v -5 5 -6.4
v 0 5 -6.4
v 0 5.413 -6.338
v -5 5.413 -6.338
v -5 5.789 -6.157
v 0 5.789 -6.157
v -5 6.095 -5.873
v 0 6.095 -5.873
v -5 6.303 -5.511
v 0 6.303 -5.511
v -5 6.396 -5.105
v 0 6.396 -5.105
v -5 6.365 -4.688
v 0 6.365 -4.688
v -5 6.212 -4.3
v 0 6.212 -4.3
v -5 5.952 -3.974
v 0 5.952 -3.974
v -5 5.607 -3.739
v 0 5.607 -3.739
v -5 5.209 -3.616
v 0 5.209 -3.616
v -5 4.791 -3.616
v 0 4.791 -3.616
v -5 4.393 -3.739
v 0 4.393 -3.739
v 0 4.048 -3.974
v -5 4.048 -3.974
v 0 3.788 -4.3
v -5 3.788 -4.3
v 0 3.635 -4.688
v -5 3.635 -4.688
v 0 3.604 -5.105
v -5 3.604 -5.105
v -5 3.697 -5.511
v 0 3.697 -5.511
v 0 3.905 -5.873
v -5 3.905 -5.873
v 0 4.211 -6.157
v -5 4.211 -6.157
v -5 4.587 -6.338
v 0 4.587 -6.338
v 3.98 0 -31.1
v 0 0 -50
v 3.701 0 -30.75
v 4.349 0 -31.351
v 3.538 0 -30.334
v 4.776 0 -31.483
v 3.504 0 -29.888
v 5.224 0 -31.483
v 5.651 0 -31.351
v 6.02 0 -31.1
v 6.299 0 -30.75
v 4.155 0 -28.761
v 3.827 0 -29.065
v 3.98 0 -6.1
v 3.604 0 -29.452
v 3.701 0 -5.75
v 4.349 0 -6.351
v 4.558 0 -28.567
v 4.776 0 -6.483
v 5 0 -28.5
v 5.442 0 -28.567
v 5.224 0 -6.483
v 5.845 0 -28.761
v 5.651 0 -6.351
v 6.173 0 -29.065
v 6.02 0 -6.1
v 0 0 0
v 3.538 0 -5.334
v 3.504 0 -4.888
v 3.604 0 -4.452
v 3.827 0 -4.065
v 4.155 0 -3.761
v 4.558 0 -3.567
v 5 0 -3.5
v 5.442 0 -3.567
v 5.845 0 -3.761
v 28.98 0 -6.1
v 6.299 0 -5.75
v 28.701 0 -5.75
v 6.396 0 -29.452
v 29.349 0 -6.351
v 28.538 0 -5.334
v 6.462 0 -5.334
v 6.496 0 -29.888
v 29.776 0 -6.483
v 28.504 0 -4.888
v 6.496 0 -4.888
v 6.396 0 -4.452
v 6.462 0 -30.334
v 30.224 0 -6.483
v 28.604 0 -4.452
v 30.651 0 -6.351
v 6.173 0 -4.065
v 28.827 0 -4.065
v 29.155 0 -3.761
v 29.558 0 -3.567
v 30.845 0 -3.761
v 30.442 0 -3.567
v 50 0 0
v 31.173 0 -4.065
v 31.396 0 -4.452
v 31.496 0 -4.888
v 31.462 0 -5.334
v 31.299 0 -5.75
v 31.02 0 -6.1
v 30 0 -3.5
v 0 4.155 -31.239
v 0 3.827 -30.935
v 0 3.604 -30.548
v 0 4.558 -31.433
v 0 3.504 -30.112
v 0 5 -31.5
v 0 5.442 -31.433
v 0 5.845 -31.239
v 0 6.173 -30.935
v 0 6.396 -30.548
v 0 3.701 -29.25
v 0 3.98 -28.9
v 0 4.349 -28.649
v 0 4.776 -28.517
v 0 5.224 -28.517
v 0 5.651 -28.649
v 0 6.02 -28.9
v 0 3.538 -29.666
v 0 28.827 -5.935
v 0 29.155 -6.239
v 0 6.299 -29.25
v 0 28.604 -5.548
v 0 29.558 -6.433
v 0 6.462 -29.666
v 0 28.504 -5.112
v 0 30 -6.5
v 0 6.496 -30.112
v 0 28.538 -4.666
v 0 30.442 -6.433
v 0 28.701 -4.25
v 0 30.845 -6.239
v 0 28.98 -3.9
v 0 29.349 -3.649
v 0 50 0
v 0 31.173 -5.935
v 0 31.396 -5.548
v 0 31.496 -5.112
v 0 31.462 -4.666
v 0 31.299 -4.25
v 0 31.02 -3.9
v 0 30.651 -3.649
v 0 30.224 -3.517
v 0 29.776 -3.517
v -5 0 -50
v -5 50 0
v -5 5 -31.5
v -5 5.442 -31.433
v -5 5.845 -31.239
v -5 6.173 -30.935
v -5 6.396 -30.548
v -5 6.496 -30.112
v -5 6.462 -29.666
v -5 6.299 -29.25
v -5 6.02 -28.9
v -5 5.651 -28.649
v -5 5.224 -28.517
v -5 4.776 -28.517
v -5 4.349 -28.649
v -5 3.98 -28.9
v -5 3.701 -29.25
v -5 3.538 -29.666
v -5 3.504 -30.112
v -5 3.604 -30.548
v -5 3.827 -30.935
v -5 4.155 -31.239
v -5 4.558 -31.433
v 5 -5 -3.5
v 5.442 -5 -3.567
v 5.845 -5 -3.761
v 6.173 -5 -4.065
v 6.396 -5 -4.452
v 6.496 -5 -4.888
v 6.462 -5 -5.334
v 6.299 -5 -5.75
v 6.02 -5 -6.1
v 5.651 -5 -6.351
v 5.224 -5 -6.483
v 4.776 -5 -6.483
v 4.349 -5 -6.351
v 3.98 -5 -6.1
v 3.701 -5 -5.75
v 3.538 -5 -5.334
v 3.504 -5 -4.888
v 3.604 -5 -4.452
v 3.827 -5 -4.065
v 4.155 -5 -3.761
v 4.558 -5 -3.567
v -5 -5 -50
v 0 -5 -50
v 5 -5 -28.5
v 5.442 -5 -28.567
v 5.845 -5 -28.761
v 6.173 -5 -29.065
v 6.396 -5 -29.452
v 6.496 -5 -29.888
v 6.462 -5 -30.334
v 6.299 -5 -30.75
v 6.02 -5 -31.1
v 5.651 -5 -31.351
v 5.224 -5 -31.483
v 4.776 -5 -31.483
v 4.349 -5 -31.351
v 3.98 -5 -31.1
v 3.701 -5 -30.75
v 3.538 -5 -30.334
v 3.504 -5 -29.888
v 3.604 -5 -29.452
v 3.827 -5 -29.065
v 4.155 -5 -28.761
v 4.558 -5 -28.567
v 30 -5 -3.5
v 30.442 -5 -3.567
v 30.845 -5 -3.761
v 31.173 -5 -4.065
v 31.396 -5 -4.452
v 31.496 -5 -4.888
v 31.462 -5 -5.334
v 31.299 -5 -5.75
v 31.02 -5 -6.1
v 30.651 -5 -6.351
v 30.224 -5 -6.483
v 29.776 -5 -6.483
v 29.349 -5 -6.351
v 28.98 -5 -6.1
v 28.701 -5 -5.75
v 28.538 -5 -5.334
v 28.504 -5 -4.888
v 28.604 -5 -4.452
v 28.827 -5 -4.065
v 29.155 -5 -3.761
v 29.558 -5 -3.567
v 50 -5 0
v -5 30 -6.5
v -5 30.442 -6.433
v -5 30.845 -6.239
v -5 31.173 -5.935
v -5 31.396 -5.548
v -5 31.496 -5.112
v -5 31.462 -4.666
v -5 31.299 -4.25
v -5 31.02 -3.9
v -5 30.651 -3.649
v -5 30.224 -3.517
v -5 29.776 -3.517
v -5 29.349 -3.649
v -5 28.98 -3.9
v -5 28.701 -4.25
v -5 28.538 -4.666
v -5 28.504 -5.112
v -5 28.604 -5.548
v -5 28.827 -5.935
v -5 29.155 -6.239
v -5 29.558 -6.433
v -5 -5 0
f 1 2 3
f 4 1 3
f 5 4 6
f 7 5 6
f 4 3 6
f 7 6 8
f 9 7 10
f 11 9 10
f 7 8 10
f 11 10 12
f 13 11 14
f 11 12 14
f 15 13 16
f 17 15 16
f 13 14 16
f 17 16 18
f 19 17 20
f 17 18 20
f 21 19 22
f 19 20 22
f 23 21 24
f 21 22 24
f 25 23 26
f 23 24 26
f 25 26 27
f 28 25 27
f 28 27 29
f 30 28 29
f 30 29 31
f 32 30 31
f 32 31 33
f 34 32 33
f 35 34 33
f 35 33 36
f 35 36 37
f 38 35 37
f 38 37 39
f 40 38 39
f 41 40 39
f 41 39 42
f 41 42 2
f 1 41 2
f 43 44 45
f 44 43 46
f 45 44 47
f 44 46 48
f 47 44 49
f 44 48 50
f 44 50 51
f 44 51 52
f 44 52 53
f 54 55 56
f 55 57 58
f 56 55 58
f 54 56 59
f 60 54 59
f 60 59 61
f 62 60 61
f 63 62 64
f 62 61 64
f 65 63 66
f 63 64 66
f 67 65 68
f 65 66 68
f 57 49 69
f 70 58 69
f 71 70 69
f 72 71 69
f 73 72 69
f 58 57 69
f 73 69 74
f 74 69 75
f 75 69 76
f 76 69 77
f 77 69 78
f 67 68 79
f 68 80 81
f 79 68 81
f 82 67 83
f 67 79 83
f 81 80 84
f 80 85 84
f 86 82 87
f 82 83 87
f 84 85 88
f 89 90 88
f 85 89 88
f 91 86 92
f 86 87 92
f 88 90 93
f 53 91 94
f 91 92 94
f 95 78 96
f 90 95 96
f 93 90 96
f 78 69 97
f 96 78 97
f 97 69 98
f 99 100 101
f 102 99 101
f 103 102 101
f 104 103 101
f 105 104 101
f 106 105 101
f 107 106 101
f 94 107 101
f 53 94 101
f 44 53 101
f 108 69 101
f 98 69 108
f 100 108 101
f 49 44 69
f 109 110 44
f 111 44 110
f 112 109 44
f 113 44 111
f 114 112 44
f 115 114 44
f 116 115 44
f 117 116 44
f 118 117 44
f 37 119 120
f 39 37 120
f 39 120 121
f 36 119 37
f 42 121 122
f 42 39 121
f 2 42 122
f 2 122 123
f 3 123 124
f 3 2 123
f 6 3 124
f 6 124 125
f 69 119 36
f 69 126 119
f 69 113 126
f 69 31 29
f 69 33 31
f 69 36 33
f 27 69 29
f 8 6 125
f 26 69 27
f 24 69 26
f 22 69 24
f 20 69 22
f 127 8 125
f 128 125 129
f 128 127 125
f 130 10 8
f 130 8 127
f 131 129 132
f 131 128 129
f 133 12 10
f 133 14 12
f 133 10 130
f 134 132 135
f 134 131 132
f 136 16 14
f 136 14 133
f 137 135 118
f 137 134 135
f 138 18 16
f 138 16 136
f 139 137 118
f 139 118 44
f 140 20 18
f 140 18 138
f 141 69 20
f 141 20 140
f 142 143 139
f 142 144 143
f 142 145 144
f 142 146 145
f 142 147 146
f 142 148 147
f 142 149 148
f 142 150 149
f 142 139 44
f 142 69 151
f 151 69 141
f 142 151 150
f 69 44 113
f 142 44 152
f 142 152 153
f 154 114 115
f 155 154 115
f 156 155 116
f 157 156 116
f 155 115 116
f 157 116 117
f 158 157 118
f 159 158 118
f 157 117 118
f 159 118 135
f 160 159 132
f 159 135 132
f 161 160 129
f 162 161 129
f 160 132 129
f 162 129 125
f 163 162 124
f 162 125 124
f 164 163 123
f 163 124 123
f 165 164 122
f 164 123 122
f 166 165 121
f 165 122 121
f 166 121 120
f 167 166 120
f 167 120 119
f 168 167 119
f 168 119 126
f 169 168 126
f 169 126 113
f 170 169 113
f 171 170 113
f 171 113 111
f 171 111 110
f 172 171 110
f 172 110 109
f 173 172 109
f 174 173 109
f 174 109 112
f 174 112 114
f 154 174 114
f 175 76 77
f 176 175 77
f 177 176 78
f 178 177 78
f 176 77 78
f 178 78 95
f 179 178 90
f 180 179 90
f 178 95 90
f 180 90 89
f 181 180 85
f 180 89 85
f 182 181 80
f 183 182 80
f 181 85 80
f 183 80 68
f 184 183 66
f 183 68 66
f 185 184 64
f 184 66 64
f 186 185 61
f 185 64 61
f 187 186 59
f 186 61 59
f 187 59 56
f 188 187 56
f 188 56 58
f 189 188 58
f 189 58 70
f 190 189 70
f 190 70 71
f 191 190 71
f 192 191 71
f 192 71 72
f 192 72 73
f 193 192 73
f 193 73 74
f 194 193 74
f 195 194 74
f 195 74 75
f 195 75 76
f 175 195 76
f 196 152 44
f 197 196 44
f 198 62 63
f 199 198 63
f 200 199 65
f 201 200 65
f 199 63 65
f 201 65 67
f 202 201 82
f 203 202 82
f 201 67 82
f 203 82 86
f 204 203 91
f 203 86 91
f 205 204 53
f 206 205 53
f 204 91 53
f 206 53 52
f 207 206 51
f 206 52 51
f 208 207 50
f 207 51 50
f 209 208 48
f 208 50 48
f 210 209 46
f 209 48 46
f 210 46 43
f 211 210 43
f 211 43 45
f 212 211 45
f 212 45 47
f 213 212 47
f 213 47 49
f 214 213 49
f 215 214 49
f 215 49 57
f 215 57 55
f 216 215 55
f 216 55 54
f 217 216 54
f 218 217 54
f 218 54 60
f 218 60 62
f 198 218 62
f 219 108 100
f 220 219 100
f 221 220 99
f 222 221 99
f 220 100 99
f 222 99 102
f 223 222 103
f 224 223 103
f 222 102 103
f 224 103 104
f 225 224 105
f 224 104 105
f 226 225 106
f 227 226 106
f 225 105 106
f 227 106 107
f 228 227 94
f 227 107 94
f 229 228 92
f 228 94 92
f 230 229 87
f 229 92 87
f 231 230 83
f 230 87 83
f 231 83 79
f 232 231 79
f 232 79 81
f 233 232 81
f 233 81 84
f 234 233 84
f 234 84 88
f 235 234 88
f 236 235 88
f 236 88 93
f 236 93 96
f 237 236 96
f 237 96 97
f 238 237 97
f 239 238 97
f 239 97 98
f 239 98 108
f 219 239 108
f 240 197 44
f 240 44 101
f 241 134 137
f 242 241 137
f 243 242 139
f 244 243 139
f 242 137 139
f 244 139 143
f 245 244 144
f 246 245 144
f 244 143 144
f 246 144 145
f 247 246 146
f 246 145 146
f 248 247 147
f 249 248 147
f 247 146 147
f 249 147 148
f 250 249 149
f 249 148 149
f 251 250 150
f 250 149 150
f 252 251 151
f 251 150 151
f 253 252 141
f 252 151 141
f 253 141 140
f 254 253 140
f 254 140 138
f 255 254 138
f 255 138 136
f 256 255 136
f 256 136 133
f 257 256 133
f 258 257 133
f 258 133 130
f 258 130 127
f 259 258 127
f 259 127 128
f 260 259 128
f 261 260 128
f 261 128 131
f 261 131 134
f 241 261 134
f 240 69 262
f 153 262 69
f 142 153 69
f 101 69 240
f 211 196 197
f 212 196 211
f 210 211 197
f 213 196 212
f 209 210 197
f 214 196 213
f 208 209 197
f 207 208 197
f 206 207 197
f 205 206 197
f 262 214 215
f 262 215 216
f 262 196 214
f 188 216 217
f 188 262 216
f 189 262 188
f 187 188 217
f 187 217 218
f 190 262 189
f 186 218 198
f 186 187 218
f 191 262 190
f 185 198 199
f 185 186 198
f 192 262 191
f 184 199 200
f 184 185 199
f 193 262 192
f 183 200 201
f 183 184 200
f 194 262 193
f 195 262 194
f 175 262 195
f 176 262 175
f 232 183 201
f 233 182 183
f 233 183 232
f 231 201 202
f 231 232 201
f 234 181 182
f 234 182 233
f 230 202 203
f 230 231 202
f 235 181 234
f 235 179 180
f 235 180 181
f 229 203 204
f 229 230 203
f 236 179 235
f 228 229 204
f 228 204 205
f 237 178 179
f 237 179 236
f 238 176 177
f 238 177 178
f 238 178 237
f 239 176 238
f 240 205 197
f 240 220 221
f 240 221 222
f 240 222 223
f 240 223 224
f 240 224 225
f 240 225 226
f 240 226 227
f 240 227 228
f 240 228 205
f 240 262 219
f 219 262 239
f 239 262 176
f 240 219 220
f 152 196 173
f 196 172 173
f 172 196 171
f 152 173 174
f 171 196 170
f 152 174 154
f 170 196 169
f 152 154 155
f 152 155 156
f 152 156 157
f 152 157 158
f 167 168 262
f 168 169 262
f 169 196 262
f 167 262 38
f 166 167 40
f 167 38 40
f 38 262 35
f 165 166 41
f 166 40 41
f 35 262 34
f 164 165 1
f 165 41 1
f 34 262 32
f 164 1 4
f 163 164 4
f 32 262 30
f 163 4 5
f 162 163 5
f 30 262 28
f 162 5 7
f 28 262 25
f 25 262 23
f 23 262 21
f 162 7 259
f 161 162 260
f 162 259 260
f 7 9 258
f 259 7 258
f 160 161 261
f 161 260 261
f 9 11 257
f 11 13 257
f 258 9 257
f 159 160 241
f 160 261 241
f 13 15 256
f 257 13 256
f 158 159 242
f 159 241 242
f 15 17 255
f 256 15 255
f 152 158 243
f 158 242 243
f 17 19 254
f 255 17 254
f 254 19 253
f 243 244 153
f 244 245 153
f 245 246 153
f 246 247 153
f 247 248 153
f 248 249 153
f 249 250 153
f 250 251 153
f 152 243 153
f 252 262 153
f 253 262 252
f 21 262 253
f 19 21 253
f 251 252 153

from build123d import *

# Parameters (mm, degrees)
EXTRUDE_1_DEPTH     = 5
EXTRUDE_2_DEPTH     = 5
SKETCH_4_W          = 5
SKETCH_4_H          = 5
EXTRUDE_4_DEPTH     = 50
EXTRUDE_13_DEPTH    = 5
SKETCH_8_R          = 1.5
SKETCH_8_R_2        = 1.4
CUT_EXTRUDE_1_DEPTH = 87.602540378
SKETCH_9_R          = 1.5
CUT_EXTRUDE_2_DEPTH = 87.602540378
SKETCH_10_R         = 1.5
CUT_EXTRUDE_3_DEPTH = 87.602540378
CUT_EXTRUDE_4_DEPTH = 5


with BuildPart() as part:
    # 草图1 → 凸台-拉伸1 (new body)
    with BuildSketch(Plane.XY):
        Polygon((0, 50), (50, 0), (50, -5), (-5, -5), (-5, 50), align=None)
    extrude(amount=EXTRUDE_1_DEPTH)



with BuildPart() as body_2:
    # 草图2 → 凸台-拉伸2 (new body)
    with BuildSketch(Plane(origin=(0, 0, 0), x_dir=(0, 0, -1), z_dir=(1, 0, 0))):
        Polygon((0, 0), (50, 0), (0, 50), align=None)
    extrude(amount=-EXTRUDE_2_DEPTH)

    # 草图4 → 凸台-拉伸4 (add)
    with BuildSketch(Plane.XY):
        with Locations((-2.5, -2.5)):
            Rectangle(SKETCH_4_W, SKETCH_4_H)
    extrude(amount=-EXTRUDE_4_DEPTH)


with BuildPart() as part_1:
    add(part.part)

    add(body_2.part)  # 凸台-拉伸13 merges body 2
    # 草图7 → 凸台-拉伸13 (add)
    with BuildSketch(Plane.XZ.offset(5)):
        Polygon((50, 0), (0, 0), (0, -50), align=None)
    extrude(amount=-EXTRUDE_13_DEPTH)

    # 草图8 → 切除-拉伸1 (cut, through all)
    with BuildSketch(Plane(origin=(0, 0, 0), x_dir=(0, 0, -1), z_dir=(1, 0, 0))):
        with Locations((5, 30)):
            Circle(SKETCH_8_R)
        with Locations((5, 5)):
            Circle(SKETCH_8_R_2)
        with Locations((30, 5)):
            Circle(SKETCH_8_R)
    extrude(amount=-CUT_EXTRUDE_1_DEPTH, mode=Mode.SUBTRACT)

    # 草图9 → 切除-拉伸2 (cut, through all)
    with BuildSketch(Plane(origin=(0, 0, 0), x_dir=(-1, 0, 0), z_dir=(0, 0, -1))):
        with Locations((-5, 30)):
            Circle(SKETCH_9_R)
        with Locations((-5, 5)):
            Circle(SKETCH_9_R)
        with Locations((-30, 5)):
            Circle(SKETCH_9_R)
    extrude(amount=-CUT_EXTRUDE_2_DEPTH, mode=Mode.SUBTRACT)

    # 草图10 → 切除-拉伸3 (cut, through all)
    with BuildSketch(Plane(origin=(0, 0, 0), x_dir=(1, 0, 0), z_dir=(0, 1, 0))):
        with Locations(Location((5, 30, 0), (0, 0, 270))):
            Circle(SKETCH_10_R)
        with Locations(Location((5, 5, 0), (0, 0, 270))):
            Circle(SKETCH_10_R)
        with Locations(Location((30, 5, 0), (0, 0, 270))):
            Circle(SKETCH_10_R)
    extrude(amount=-CUT_EXTRUDE_3_DEPTH, mode=Mode.SUBTRACT)

    # 草图11 → 切除-拉伸4 (cut)
    with BuildSketch(Plane.XY.offset(5)):
        Polygon((-5, 50), (-5, -5), (50, -5), (50, 0), (0, 50), align=None)
    extrude(amount=-CUT_EXTRUDE_4_DEPTH, mode=Mode.SUBTRACT)


solid = part_1.part
